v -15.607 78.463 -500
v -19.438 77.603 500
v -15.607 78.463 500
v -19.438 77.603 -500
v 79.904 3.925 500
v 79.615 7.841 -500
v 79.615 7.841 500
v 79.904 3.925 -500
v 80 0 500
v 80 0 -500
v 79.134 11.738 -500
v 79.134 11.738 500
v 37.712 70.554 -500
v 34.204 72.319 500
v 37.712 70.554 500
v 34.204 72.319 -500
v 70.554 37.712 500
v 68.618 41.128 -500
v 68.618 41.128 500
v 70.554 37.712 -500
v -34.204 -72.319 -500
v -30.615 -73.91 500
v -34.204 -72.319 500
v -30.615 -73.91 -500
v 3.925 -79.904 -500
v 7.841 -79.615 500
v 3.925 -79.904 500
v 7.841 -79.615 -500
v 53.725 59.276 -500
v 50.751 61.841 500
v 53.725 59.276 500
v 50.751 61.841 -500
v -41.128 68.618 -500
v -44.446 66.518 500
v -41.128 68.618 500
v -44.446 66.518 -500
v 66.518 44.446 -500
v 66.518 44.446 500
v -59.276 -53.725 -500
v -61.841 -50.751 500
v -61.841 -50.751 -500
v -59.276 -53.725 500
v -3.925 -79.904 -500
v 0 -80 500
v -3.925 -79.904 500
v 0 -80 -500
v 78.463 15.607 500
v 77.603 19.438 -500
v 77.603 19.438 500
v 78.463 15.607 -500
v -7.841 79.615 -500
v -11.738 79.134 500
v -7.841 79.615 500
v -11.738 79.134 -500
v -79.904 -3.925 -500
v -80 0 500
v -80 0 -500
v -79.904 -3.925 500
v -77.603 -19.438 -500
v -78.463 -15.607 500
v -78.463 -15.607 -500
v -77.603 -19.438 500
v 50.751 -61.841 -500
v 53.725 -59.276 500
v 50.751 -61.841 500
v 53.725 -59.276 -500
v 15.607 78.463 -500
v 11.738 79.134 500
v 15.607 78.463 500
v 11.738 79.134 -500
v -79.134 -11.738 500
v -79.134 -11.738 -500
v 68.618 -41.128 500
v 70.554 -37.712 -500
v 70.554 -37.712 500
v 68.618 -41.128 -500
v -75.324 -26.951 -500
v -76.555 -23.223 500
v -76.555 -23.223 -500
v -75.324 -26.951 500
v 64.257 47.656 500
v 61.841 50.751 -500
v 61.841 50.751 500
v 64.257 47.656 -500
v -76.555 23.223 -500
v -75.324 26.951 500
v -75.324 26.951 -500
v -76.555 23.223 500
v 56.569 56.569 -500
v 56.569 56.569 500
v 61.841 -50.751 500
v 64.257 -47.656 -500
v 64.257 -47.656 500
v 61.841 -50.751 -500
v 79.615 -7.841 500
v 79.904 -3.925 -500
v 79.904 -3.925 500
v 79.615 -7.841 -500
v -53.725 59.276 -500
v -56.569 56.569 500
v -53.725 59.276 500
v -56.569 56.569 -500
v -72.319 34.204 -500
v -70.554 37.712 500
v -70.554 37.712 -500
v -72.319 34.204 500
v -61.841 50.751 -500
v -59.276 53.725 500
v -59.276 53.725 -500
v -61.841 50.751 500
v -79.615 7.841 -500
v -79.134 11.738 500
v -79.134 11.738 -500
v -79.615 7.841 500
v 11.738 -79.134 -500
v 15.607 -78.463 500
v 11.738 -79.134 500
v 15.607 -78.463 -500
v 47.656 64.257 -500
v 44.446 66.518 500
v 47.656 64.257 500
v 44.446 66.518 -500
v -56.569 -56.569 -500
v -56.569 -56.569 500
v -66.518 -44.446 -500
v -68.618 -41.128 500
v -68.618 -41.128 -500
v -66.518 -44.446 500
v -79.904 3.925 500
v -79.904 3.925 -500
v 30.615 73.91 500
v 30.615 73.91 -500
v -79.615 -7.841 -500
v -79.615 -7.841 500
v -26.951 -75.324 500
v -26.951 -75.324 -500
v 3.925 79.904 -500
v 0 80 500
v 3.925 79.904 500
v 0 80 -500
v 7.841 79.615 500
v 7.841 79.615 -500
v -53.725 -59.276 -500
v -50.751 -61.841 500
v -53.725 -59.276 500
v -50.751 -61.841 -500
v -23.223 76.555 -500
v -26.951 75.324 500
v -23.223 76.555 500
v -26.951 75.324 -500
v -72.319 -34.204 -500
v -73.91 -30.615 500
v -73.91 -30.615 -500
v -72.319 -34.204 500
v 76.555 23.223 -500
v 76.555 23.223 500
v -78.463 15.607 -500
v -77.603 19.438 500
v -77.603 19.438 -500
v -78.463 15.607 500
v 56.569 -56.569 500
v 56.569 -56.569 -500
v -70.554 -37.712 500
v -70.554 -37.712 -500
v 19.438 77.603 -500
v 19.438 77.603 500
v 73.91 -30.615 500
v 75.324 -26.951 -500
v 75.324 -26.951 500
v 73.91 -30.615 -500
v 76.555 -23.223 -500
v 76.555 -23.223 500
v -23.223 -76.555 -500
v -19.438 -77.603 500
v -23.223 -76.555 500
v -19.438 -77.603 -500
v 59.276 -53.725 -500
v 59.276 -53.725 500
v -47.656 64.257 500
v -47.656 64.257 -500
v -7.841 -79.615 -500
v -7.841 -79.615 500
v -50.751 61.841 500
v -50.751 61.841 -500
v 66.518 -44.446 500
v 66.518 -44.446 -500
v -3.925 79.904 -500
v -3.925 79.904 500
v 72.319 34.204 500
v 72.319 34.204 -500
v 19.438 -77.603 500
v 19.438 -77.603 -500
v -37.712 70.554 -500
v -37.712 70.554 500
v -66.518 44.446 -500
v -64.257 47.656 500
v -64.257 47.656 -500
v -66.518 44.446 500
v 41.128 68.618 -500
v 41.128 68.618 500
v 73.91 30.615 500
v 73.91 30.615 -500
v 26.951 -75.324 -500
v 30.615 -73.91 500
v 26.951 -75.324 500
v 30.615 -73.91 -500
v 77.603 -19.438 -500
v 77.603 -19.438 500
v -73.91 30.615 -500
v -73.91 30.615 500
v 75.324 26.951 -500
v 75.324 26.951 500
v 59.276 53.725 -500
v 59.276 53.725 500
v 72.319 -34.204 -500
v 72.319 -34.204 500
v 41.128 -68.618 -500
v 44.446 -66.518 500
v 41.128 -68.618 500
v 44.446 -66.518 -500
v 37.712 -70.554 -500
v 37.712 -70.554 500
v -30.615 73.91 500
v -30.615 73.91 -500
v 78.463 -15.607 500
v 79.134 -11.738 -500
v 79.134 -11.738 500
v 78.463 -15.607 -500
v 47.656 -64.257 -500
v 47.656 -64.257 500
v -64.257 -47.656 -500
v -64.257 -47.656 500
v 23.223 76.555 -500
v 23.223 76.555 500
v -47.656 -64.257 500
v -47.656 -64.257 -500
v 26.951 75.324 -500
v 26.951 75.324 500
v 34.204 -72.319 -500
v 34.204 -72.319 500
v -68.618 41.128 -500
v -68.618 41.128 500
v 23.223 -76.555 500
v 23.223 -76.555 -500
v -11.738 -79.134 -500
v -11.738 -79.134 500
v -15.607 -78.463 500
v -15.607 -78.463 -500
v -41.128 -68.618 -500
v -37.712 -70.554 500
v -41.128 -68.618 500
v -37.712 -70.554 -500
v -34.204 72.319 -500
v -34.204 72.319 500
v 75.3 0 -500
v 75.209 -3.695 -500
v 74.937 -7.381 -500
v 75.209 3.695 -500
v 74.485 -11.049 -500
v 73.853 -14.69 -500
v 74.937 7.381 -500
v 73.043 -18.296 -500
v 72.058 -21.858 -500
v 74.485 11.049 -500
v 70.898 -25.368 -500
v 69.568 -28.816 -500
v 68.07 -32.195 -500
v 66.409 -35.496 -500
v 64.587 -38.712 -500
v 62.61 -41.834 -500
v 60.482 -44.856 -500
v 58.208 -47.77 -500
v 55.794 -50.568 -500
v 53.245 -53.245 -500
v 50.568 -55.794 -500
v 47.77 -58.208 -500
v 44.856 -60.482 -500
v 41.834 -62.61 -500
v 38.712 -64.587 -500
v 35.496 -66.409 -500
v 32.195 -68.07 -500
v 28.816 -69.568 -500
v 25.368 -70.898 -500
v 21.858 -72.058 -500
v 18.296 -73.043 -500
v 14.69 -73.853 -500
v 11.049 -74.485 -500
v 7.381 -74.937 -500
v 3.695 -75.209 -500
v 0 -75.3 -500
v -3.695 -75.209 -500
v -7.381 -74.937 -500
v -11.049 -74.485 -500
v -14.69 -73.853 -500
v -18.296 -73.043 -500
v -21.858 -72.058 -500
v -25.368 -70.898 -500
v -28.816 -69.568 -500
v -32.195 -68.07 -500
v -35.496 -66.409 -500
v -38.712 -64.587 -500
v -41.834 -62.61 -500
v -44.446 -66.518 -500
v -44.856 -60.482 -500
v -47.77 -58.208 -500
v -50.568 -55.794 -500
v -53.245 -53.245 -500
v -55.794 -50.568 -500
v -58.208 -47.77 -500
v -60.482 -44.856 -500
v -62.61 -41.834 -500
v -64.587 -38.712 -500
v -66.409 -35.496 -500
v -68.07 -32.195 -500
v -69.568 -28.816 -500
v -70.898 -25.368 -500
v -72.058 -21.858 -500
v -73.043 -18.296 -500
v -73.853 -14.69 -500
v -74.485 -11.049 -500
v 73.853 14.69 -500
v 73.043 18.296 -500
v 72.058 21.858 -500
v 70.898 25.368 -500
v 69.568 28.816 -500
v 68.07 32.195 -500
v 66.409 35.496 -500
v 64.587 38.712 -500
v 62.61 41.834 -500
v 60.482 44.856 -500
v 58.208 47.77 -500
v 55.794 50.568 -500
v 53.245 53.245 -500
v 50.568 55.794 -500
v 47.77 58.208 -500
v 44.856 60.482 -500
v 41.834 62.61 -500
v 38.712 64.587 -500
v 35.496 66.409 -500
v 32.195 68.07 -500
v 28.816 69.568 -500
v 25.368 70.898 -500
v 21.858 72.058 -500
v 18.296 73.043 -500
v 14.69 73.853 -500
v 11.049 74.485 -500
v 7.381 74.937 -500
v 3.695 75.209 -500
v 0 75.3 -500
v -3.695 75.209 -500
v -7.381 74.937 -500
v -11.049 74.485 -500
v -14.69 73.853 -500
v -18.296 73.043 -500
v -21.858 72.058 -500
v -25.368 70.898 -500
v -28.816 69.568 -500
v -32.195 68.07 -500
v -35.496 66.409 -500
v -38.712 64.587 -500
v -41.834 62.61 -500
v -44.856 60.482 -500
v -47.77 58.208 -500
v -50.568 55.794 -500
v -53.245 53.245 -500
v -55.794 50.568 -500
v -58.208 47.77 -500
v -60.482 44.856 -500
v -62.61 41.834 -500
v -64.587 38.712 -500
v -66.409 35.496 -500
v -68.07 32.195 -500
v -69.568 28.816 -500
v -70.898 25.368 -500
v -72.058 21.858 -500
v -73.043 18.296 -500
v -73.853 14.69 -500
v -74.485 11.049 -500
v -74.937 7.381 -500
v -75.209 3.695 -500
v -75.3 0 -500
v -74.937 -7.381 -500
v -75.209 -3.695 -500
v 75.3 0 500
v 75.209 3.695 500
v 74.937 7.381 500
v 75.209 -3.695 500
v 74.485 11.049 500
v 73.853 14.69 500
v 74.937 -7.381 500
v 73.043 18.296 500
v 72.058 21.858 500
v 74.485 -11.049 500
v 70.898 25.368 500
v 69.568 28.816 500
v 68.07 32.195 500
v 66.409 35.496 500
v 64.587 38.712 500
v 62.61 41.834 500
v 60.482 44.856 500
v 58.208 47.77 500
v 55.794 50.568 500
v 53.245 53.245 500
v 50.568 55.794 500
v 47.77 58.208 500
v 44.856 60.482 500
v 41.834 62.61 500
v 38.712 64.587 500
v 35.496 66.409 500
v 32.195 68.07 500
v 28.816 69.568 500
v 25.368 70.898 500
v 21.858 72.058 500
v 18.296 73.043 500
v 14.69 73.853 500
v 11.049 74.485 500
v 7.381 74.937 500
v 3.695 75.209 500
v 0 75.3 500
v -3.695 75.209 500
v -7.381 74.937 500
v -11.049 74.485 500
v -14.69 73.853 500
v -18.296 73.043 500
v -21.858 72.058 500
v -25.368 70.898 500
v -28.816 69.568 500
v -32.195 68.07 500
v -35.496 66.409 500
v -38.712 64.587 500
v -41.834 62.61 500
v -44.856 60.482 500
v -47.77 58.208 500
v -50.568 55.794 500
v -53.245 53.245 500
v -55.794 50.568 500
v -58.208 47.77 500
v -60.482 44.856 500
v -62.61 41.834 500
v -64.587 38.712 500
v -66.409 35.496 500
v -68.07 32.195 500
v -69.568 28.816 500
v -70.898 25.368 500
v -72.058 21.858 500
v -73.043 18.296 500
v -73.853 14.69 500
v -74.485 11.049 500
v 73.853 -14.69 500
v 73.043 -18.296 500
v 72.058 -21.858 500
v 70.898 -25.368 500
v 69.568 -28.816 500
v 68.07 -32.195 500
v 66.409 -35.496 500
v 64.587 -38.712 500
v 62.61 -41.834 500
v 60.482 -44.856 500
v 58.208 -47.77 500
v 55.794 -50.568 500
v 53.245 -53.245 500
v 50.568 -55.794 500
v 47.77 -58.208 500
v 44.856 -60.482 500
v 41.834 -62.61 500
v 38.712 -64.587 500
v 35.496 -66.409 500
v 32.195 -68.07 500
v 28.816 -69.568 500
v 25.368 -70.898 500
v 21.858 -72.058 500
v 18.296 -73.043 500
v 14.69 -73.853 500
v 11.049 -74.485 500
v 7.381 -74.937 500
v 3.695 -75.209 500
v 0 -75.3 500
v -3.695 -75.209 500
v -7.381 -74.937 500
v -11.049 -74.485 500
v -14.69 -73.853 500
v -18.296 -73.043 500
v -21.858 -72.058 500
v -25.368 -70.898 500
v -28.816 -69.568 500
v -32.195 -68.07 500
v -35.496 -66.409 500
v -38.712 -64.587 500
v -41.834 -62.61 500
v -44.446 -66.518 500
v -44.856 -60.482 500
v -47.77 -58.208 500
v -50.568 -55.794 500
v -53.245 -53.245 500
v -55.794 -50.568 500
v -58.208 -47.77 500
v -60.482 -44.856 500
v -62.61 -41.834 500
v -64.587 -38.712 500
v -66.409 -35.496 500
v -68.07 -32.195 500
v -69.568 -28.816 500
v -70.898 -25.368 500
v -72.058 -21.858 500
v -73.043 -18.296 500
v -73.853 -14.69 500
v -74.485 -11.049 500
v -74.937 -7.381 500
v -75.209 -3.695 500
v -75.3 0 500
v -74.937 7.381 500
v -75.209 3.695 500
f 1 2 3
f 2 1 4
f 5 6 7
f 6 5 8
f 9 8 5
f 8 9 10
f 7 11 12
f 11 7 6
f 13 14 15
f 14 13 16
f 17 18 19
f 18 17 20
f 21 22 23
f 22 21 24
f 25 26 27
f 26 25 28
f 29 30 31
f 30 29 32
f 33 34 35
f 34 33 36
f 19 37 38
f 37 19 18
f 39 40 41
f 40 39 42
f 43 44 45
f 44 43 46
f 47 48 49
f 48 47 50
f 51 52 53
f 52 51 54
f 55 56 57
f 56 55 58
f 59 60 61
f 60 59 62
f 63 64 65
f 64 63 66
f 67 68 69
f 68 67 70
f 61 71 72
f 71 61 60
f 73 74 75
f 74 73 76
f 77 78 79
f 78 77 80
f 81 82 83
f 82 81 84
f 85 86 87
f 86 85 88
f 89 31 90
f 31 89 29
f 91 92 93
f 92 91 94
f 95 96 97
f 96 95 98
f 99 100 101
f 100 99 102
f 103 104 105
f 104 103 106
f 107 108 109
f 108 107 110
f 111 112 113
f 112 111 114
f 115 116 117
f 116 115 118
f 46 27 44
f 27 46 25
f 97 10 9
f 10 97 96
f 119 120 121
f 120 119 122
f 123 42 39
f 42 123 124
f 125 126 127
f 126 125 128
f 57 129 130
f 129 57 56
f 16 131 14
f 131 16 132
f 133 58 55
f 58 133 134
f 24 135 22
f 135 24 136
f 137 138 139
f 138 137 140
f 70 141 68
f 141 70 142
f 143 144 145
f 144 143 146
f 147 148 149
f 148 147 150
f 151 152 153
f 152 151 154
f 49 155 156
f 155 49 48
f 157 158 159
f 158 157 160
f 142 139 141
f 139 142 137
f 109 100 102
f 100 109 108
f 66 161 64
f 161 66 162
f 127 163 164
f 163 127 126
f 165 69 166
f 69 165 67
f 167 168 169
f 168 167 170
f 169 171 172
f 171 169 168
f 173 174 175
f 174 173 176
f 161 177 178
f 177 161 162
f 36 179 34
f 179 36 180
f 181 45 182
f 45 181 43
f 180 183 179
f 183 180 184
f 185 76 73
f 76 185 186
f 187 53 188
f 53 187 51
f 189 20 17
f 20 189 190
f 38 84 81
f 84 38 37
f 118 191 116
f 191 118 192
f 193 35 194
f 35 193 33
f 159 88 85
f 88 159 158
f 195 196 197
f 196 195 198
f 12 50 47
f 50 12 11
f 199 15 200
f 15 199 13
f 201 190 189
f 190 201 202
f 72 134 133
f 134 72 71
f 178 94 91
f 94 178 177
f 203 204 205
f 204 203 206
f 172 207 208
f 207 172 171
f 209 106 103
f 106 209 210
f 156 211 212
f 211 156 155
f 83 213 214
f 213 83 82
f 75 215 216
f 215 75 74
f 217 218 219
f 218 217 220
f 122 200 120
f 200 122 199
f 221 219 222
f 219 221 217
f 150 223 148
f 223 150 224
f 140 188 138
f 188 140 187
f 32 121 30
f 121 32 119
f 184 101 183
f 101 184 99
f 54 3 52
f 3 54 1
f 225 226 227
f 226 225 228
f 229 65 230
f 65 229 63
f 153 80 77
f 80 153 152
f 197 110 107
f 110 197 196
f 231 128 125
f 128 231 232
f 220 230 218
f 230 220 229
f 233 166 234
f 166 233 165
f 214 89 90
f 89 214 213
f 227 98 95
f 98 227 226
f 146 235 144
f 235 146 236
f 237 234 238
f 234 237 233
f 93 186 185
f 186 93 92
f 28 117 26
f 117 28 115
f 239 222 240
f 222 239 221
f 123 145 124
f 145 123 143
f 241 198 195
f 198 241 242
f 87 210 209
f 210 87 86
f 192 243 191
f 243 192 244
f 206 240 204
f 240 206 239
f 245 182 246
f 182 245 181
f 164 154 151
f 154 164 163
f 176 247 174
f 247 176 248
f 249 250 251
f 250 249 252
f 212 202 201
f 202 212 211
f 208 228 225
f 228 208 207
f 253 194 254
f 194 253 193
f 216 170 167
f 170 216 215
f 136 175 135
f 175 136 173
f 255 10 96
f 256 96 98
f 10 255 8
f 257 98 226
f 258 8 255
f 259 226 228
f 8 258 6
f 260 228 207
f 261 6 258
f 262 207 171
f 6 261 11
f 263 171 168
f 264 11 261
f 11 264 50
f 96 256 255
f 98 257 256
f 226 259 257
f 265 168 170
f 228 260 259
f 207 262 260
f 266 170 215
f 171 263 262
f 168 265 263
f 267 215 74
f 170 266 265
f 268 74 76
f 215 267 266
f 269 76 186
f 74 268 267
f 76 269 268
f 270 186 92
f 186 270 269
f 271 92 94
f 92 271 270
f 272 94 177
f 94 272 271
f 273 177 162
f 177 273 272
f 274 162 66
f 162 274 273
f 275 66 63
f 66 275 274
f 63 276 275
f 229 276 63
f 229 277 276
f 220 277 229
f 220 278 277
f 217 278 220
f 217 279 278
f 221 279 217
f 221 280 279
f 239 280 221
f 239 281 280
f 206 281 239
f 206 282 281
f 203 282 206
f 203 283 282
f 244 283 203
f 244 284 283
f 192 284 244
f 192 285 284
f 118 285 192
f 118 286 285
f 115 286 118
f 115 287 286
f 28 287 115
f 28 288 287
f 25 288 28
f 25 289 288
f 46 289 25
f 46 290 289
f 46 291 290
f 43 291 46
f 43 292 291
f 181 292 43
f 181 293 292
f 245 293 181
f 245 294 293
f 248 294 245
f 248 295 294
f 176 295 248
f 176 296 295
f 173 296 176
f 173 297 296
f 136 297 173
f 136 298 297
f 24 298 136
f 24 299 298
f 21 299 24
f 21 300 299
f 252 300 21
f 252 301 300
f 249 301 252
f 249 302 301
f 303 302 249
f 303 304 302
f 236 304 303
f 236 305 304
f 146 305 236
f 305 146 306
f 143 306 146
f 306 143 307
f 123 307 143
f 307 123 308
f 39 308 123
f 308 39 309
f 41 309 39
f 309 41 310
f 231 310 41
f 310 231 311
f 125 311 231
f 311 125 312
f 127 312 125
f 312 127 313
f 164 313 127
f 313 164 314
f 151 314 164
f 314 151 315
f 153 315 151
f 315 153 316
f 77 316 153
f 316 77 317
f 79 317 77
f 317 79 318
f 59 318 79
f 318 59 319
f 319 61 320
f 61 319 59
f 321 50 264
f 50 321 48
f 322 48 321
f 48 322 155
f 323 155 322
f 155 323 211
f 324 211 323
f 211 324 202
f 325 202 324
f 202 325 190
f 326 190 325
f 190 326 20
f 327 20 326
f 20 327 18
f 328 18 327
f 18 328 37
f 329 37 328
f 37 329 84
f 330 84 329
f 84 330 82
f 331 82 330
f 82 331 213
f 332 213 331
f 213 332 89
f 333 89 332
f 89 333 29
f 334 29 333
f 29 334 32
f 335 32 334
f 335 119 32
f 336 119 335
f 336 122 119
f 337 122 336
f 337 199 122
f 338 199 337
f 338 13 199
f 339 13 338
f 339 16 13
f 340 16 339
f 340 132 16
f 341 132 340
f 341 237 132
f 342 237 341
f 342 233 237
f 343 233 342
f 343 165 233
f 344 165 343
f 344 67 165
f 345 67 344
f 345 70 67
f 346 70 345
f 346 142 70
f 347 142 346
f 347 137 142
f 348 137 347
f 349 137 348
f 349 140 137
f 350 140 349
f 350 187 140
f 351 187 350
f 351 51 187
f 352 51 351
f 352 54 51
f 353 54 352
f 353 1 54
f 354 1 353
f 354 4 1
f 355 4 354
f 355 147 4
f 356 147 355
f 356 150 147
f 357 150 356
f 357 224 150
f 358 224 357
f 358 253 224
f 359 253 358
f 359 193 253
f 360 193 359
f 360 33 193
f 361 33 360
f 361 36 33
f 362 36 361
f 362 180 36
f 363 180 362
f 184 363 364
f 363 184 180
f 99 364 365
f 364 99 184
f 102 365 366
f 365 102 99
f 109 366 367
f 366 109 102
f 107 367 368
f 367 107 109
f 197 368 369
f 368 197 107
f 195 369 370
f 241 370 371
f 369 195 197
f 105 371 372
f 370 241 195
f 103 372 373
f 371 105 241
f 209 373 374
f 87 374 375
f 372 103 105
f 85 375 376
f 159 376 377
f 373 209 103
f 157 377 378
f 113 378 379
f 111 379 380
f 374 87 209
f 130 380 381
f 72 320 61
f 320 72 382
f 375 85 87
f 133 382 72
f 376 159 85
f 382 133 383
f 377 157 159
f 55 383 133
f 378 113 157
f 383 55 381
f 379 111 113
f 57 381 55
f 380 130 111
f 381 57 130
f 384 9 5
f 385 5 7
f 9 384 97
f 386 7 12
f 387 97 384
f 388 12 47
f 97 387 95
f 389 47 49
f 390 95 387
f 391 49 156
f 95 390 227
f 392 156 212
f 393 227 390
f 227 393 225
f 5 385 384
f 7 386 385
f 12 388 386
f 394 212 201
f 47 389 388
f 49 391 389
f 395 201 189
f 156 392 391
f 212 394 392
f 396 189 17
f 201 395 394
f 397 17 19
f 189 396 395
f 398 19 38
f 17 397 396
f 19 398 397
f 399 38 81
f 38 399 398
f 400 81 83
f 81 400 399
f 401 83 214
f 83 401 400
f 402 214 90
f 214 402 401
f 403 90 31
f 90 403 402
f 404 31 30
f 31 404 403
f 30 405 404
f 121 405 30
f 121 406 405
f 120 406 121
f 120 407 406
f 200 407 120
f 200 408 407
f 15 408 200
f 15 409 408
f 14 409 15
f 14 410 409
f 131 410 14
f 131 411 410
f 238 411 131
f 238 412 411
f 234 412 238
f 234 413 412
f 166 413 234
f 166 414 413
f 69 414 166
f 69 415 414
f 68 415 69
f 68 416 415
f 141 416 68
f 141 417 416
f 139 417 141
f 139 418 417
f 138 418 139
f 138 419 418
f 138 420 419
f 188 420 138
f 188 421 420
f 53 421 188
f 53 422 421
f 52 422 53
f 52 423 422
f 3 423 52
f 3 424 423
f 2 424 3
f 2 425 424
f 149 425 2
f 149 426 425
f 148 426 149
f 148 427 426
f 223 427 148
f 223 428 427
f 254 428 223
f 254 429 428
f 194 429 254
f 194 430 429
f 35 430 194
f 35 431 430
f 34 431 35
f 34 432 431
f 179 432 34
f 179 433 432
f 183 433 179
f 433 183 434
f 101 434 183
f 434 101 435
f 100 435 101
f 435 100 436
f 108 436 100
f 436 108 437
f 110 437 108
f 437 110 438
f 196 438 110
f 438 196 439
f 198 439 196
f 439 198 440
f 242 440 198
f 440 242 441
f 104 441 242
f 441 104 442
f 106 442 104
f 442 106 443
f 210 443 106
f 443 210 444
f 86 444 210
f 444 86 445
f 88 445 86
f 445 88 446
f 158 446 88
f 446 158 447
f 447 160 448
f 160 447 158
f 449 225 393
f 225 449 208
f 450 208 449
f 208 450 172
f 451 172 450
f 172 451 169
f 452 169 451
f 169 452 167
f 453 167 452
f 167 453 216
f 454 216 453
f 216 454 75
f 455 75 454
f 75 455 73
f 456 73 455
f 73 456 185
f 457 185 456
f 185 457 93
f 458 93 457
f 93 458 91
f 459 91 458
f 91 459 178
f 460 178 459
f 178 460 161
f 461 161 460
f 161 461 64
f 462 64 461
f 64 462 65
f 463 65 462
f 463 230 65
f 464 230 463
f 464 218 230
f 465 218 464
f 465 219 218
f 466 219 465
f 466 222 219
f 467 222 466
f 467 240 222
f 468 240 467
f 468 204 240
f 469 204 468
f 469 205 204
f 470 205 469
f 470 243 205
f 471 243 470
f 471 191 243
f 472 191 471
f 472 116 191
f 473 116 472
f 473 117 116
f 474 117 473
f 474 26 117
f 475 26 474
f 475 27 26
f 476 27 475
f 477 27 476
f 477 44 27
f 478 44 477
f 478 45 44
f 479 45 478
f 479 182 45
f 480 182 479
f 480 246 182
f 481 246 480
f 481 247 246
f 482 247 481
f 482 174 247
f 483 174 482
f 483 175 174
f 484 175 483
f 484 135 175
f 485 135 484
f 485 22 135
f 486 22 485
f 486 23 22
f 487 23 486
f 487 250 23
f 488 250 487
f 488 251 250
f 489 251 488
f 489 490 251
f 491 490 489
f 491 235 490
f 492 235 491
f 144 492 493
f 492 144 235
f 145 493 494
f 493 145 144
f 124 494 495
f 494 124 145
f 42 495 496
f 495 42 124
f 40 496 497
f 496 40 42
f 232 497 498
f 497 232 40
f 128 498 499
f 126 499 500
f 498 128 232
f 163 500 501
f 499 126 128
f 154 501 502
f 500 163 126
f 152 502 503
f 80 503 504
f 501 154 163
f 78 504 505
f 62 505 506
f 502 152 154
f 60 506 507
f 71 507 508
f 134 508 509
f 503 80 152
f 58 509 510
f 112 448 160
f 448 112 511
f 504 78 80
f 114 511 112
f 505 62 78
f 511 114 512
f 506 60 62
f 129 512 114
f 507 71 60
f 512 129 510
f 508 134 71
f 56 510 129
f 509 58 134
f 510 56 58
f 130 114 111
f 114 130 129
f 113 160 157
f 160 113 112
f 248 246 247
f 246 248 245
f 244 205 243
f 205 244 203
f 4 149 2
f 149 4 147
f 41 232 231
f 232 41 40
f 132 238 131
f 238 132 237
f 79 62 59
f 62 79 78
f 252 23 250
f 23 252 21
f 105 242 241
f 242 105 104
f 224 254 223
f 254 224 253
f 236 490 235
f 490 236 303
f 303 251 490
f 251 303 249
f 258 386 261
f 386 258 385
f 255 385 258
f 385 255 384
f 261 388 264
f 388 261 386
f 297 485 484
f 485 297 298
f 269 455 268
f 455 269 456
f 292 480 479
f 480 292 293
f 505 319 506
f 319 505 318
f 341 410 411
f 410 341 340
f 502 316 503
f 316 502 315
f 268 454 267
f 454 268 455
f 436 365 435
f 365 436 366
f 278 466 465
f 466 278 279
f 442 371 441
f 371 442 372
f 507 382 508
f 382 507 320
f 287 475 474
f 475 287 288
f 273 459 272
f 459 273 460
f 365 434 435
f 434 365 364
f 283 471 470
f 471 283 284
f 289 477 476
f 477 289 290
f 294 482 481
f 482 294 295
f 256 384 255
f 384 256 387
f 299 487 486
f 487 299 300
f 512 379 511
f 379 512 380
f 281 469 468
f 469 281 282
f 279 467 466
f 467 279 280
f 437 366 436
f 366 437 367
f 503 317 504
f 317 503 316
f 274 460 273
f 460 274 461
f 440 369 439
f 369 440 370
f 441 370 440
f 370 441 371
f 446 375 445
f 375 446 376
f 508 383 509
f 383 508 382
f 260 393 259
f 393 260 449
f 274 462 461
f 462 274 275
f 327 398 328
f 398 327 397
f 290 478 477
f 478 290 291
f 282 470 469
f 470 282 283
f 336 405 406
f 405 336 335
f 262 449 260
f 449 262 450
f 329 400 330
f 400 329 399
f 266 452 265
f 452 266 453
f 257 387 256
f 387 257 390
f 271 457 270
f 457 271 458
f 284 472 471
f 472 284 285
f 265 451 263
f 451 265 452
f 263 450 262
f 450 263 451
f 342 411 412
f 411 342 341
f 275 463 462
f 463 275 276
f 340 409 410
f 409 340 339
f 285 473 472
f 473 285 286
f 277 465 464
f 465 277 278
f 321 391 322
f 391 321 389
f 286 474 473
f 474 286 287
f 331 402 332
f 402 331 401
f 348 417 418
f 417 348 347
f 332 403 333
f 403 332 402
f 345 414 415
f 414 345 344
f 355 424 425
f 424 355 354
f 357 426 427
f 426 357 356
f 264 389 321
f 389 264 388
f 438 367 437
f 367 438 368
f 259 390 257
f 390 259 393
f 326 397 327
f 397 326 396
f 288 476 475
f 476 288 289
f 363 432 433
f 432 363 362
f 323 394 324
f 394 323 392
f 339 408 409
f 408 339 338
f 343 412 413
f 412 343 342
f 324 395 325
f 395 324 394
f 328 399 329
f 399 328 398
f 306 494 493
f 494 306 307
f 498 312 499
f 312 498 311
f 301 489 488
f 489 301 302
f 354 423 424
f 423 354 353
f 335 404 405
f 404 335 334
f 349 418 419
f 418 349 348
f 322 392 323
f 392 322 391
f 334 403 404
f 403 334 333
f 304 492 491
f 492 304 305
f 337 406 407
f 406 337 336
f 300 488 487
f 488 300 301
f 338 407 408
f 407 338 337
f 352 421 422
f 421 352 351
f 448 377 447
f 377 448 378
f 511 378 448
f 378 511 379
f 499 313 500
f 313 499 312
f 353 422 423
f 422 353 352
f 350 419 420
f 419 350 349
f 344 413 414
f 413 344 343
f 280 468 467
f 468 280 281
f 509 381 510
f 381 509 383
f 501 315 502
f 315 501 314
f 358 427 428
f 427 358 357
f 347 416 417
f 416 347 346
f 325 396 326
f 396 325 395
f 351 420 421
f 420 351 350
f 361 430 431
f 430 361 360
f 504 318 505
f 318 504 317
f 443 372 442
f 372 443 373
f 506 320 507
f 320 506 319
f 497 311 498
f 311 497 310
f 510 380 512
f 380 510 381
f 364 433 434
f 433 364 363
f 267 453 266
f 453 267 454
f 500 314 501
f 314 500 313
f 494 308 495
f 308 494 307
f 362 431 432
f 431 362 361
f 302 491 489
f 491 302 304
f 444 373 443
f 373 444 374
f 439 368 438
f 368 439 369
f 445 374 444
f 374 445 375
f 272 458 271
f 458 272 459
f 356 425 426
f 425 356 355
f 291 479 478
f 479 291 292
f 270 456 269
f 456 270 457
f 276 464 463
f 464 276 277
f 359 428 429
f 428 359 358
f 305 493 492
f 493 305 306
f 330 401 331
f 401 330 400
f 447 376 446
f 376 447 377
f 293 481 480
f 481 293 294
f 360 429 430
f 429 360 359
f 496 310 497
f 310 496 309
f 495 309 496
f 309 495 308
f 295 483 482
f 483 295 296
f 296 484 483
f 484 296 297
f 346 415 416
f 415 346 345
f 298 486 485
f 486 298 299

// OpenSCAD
$fn=128;

module ht_pipe(od=160, length=1000, wall=4.7) {
    difference() {
        cylinder(h=length, d=od, center=true);
        cylinder(h=length+2, d=od-2*wall, center=true);
    }
}

ht_pipe(od=160, length=1000, wall=4.7);
